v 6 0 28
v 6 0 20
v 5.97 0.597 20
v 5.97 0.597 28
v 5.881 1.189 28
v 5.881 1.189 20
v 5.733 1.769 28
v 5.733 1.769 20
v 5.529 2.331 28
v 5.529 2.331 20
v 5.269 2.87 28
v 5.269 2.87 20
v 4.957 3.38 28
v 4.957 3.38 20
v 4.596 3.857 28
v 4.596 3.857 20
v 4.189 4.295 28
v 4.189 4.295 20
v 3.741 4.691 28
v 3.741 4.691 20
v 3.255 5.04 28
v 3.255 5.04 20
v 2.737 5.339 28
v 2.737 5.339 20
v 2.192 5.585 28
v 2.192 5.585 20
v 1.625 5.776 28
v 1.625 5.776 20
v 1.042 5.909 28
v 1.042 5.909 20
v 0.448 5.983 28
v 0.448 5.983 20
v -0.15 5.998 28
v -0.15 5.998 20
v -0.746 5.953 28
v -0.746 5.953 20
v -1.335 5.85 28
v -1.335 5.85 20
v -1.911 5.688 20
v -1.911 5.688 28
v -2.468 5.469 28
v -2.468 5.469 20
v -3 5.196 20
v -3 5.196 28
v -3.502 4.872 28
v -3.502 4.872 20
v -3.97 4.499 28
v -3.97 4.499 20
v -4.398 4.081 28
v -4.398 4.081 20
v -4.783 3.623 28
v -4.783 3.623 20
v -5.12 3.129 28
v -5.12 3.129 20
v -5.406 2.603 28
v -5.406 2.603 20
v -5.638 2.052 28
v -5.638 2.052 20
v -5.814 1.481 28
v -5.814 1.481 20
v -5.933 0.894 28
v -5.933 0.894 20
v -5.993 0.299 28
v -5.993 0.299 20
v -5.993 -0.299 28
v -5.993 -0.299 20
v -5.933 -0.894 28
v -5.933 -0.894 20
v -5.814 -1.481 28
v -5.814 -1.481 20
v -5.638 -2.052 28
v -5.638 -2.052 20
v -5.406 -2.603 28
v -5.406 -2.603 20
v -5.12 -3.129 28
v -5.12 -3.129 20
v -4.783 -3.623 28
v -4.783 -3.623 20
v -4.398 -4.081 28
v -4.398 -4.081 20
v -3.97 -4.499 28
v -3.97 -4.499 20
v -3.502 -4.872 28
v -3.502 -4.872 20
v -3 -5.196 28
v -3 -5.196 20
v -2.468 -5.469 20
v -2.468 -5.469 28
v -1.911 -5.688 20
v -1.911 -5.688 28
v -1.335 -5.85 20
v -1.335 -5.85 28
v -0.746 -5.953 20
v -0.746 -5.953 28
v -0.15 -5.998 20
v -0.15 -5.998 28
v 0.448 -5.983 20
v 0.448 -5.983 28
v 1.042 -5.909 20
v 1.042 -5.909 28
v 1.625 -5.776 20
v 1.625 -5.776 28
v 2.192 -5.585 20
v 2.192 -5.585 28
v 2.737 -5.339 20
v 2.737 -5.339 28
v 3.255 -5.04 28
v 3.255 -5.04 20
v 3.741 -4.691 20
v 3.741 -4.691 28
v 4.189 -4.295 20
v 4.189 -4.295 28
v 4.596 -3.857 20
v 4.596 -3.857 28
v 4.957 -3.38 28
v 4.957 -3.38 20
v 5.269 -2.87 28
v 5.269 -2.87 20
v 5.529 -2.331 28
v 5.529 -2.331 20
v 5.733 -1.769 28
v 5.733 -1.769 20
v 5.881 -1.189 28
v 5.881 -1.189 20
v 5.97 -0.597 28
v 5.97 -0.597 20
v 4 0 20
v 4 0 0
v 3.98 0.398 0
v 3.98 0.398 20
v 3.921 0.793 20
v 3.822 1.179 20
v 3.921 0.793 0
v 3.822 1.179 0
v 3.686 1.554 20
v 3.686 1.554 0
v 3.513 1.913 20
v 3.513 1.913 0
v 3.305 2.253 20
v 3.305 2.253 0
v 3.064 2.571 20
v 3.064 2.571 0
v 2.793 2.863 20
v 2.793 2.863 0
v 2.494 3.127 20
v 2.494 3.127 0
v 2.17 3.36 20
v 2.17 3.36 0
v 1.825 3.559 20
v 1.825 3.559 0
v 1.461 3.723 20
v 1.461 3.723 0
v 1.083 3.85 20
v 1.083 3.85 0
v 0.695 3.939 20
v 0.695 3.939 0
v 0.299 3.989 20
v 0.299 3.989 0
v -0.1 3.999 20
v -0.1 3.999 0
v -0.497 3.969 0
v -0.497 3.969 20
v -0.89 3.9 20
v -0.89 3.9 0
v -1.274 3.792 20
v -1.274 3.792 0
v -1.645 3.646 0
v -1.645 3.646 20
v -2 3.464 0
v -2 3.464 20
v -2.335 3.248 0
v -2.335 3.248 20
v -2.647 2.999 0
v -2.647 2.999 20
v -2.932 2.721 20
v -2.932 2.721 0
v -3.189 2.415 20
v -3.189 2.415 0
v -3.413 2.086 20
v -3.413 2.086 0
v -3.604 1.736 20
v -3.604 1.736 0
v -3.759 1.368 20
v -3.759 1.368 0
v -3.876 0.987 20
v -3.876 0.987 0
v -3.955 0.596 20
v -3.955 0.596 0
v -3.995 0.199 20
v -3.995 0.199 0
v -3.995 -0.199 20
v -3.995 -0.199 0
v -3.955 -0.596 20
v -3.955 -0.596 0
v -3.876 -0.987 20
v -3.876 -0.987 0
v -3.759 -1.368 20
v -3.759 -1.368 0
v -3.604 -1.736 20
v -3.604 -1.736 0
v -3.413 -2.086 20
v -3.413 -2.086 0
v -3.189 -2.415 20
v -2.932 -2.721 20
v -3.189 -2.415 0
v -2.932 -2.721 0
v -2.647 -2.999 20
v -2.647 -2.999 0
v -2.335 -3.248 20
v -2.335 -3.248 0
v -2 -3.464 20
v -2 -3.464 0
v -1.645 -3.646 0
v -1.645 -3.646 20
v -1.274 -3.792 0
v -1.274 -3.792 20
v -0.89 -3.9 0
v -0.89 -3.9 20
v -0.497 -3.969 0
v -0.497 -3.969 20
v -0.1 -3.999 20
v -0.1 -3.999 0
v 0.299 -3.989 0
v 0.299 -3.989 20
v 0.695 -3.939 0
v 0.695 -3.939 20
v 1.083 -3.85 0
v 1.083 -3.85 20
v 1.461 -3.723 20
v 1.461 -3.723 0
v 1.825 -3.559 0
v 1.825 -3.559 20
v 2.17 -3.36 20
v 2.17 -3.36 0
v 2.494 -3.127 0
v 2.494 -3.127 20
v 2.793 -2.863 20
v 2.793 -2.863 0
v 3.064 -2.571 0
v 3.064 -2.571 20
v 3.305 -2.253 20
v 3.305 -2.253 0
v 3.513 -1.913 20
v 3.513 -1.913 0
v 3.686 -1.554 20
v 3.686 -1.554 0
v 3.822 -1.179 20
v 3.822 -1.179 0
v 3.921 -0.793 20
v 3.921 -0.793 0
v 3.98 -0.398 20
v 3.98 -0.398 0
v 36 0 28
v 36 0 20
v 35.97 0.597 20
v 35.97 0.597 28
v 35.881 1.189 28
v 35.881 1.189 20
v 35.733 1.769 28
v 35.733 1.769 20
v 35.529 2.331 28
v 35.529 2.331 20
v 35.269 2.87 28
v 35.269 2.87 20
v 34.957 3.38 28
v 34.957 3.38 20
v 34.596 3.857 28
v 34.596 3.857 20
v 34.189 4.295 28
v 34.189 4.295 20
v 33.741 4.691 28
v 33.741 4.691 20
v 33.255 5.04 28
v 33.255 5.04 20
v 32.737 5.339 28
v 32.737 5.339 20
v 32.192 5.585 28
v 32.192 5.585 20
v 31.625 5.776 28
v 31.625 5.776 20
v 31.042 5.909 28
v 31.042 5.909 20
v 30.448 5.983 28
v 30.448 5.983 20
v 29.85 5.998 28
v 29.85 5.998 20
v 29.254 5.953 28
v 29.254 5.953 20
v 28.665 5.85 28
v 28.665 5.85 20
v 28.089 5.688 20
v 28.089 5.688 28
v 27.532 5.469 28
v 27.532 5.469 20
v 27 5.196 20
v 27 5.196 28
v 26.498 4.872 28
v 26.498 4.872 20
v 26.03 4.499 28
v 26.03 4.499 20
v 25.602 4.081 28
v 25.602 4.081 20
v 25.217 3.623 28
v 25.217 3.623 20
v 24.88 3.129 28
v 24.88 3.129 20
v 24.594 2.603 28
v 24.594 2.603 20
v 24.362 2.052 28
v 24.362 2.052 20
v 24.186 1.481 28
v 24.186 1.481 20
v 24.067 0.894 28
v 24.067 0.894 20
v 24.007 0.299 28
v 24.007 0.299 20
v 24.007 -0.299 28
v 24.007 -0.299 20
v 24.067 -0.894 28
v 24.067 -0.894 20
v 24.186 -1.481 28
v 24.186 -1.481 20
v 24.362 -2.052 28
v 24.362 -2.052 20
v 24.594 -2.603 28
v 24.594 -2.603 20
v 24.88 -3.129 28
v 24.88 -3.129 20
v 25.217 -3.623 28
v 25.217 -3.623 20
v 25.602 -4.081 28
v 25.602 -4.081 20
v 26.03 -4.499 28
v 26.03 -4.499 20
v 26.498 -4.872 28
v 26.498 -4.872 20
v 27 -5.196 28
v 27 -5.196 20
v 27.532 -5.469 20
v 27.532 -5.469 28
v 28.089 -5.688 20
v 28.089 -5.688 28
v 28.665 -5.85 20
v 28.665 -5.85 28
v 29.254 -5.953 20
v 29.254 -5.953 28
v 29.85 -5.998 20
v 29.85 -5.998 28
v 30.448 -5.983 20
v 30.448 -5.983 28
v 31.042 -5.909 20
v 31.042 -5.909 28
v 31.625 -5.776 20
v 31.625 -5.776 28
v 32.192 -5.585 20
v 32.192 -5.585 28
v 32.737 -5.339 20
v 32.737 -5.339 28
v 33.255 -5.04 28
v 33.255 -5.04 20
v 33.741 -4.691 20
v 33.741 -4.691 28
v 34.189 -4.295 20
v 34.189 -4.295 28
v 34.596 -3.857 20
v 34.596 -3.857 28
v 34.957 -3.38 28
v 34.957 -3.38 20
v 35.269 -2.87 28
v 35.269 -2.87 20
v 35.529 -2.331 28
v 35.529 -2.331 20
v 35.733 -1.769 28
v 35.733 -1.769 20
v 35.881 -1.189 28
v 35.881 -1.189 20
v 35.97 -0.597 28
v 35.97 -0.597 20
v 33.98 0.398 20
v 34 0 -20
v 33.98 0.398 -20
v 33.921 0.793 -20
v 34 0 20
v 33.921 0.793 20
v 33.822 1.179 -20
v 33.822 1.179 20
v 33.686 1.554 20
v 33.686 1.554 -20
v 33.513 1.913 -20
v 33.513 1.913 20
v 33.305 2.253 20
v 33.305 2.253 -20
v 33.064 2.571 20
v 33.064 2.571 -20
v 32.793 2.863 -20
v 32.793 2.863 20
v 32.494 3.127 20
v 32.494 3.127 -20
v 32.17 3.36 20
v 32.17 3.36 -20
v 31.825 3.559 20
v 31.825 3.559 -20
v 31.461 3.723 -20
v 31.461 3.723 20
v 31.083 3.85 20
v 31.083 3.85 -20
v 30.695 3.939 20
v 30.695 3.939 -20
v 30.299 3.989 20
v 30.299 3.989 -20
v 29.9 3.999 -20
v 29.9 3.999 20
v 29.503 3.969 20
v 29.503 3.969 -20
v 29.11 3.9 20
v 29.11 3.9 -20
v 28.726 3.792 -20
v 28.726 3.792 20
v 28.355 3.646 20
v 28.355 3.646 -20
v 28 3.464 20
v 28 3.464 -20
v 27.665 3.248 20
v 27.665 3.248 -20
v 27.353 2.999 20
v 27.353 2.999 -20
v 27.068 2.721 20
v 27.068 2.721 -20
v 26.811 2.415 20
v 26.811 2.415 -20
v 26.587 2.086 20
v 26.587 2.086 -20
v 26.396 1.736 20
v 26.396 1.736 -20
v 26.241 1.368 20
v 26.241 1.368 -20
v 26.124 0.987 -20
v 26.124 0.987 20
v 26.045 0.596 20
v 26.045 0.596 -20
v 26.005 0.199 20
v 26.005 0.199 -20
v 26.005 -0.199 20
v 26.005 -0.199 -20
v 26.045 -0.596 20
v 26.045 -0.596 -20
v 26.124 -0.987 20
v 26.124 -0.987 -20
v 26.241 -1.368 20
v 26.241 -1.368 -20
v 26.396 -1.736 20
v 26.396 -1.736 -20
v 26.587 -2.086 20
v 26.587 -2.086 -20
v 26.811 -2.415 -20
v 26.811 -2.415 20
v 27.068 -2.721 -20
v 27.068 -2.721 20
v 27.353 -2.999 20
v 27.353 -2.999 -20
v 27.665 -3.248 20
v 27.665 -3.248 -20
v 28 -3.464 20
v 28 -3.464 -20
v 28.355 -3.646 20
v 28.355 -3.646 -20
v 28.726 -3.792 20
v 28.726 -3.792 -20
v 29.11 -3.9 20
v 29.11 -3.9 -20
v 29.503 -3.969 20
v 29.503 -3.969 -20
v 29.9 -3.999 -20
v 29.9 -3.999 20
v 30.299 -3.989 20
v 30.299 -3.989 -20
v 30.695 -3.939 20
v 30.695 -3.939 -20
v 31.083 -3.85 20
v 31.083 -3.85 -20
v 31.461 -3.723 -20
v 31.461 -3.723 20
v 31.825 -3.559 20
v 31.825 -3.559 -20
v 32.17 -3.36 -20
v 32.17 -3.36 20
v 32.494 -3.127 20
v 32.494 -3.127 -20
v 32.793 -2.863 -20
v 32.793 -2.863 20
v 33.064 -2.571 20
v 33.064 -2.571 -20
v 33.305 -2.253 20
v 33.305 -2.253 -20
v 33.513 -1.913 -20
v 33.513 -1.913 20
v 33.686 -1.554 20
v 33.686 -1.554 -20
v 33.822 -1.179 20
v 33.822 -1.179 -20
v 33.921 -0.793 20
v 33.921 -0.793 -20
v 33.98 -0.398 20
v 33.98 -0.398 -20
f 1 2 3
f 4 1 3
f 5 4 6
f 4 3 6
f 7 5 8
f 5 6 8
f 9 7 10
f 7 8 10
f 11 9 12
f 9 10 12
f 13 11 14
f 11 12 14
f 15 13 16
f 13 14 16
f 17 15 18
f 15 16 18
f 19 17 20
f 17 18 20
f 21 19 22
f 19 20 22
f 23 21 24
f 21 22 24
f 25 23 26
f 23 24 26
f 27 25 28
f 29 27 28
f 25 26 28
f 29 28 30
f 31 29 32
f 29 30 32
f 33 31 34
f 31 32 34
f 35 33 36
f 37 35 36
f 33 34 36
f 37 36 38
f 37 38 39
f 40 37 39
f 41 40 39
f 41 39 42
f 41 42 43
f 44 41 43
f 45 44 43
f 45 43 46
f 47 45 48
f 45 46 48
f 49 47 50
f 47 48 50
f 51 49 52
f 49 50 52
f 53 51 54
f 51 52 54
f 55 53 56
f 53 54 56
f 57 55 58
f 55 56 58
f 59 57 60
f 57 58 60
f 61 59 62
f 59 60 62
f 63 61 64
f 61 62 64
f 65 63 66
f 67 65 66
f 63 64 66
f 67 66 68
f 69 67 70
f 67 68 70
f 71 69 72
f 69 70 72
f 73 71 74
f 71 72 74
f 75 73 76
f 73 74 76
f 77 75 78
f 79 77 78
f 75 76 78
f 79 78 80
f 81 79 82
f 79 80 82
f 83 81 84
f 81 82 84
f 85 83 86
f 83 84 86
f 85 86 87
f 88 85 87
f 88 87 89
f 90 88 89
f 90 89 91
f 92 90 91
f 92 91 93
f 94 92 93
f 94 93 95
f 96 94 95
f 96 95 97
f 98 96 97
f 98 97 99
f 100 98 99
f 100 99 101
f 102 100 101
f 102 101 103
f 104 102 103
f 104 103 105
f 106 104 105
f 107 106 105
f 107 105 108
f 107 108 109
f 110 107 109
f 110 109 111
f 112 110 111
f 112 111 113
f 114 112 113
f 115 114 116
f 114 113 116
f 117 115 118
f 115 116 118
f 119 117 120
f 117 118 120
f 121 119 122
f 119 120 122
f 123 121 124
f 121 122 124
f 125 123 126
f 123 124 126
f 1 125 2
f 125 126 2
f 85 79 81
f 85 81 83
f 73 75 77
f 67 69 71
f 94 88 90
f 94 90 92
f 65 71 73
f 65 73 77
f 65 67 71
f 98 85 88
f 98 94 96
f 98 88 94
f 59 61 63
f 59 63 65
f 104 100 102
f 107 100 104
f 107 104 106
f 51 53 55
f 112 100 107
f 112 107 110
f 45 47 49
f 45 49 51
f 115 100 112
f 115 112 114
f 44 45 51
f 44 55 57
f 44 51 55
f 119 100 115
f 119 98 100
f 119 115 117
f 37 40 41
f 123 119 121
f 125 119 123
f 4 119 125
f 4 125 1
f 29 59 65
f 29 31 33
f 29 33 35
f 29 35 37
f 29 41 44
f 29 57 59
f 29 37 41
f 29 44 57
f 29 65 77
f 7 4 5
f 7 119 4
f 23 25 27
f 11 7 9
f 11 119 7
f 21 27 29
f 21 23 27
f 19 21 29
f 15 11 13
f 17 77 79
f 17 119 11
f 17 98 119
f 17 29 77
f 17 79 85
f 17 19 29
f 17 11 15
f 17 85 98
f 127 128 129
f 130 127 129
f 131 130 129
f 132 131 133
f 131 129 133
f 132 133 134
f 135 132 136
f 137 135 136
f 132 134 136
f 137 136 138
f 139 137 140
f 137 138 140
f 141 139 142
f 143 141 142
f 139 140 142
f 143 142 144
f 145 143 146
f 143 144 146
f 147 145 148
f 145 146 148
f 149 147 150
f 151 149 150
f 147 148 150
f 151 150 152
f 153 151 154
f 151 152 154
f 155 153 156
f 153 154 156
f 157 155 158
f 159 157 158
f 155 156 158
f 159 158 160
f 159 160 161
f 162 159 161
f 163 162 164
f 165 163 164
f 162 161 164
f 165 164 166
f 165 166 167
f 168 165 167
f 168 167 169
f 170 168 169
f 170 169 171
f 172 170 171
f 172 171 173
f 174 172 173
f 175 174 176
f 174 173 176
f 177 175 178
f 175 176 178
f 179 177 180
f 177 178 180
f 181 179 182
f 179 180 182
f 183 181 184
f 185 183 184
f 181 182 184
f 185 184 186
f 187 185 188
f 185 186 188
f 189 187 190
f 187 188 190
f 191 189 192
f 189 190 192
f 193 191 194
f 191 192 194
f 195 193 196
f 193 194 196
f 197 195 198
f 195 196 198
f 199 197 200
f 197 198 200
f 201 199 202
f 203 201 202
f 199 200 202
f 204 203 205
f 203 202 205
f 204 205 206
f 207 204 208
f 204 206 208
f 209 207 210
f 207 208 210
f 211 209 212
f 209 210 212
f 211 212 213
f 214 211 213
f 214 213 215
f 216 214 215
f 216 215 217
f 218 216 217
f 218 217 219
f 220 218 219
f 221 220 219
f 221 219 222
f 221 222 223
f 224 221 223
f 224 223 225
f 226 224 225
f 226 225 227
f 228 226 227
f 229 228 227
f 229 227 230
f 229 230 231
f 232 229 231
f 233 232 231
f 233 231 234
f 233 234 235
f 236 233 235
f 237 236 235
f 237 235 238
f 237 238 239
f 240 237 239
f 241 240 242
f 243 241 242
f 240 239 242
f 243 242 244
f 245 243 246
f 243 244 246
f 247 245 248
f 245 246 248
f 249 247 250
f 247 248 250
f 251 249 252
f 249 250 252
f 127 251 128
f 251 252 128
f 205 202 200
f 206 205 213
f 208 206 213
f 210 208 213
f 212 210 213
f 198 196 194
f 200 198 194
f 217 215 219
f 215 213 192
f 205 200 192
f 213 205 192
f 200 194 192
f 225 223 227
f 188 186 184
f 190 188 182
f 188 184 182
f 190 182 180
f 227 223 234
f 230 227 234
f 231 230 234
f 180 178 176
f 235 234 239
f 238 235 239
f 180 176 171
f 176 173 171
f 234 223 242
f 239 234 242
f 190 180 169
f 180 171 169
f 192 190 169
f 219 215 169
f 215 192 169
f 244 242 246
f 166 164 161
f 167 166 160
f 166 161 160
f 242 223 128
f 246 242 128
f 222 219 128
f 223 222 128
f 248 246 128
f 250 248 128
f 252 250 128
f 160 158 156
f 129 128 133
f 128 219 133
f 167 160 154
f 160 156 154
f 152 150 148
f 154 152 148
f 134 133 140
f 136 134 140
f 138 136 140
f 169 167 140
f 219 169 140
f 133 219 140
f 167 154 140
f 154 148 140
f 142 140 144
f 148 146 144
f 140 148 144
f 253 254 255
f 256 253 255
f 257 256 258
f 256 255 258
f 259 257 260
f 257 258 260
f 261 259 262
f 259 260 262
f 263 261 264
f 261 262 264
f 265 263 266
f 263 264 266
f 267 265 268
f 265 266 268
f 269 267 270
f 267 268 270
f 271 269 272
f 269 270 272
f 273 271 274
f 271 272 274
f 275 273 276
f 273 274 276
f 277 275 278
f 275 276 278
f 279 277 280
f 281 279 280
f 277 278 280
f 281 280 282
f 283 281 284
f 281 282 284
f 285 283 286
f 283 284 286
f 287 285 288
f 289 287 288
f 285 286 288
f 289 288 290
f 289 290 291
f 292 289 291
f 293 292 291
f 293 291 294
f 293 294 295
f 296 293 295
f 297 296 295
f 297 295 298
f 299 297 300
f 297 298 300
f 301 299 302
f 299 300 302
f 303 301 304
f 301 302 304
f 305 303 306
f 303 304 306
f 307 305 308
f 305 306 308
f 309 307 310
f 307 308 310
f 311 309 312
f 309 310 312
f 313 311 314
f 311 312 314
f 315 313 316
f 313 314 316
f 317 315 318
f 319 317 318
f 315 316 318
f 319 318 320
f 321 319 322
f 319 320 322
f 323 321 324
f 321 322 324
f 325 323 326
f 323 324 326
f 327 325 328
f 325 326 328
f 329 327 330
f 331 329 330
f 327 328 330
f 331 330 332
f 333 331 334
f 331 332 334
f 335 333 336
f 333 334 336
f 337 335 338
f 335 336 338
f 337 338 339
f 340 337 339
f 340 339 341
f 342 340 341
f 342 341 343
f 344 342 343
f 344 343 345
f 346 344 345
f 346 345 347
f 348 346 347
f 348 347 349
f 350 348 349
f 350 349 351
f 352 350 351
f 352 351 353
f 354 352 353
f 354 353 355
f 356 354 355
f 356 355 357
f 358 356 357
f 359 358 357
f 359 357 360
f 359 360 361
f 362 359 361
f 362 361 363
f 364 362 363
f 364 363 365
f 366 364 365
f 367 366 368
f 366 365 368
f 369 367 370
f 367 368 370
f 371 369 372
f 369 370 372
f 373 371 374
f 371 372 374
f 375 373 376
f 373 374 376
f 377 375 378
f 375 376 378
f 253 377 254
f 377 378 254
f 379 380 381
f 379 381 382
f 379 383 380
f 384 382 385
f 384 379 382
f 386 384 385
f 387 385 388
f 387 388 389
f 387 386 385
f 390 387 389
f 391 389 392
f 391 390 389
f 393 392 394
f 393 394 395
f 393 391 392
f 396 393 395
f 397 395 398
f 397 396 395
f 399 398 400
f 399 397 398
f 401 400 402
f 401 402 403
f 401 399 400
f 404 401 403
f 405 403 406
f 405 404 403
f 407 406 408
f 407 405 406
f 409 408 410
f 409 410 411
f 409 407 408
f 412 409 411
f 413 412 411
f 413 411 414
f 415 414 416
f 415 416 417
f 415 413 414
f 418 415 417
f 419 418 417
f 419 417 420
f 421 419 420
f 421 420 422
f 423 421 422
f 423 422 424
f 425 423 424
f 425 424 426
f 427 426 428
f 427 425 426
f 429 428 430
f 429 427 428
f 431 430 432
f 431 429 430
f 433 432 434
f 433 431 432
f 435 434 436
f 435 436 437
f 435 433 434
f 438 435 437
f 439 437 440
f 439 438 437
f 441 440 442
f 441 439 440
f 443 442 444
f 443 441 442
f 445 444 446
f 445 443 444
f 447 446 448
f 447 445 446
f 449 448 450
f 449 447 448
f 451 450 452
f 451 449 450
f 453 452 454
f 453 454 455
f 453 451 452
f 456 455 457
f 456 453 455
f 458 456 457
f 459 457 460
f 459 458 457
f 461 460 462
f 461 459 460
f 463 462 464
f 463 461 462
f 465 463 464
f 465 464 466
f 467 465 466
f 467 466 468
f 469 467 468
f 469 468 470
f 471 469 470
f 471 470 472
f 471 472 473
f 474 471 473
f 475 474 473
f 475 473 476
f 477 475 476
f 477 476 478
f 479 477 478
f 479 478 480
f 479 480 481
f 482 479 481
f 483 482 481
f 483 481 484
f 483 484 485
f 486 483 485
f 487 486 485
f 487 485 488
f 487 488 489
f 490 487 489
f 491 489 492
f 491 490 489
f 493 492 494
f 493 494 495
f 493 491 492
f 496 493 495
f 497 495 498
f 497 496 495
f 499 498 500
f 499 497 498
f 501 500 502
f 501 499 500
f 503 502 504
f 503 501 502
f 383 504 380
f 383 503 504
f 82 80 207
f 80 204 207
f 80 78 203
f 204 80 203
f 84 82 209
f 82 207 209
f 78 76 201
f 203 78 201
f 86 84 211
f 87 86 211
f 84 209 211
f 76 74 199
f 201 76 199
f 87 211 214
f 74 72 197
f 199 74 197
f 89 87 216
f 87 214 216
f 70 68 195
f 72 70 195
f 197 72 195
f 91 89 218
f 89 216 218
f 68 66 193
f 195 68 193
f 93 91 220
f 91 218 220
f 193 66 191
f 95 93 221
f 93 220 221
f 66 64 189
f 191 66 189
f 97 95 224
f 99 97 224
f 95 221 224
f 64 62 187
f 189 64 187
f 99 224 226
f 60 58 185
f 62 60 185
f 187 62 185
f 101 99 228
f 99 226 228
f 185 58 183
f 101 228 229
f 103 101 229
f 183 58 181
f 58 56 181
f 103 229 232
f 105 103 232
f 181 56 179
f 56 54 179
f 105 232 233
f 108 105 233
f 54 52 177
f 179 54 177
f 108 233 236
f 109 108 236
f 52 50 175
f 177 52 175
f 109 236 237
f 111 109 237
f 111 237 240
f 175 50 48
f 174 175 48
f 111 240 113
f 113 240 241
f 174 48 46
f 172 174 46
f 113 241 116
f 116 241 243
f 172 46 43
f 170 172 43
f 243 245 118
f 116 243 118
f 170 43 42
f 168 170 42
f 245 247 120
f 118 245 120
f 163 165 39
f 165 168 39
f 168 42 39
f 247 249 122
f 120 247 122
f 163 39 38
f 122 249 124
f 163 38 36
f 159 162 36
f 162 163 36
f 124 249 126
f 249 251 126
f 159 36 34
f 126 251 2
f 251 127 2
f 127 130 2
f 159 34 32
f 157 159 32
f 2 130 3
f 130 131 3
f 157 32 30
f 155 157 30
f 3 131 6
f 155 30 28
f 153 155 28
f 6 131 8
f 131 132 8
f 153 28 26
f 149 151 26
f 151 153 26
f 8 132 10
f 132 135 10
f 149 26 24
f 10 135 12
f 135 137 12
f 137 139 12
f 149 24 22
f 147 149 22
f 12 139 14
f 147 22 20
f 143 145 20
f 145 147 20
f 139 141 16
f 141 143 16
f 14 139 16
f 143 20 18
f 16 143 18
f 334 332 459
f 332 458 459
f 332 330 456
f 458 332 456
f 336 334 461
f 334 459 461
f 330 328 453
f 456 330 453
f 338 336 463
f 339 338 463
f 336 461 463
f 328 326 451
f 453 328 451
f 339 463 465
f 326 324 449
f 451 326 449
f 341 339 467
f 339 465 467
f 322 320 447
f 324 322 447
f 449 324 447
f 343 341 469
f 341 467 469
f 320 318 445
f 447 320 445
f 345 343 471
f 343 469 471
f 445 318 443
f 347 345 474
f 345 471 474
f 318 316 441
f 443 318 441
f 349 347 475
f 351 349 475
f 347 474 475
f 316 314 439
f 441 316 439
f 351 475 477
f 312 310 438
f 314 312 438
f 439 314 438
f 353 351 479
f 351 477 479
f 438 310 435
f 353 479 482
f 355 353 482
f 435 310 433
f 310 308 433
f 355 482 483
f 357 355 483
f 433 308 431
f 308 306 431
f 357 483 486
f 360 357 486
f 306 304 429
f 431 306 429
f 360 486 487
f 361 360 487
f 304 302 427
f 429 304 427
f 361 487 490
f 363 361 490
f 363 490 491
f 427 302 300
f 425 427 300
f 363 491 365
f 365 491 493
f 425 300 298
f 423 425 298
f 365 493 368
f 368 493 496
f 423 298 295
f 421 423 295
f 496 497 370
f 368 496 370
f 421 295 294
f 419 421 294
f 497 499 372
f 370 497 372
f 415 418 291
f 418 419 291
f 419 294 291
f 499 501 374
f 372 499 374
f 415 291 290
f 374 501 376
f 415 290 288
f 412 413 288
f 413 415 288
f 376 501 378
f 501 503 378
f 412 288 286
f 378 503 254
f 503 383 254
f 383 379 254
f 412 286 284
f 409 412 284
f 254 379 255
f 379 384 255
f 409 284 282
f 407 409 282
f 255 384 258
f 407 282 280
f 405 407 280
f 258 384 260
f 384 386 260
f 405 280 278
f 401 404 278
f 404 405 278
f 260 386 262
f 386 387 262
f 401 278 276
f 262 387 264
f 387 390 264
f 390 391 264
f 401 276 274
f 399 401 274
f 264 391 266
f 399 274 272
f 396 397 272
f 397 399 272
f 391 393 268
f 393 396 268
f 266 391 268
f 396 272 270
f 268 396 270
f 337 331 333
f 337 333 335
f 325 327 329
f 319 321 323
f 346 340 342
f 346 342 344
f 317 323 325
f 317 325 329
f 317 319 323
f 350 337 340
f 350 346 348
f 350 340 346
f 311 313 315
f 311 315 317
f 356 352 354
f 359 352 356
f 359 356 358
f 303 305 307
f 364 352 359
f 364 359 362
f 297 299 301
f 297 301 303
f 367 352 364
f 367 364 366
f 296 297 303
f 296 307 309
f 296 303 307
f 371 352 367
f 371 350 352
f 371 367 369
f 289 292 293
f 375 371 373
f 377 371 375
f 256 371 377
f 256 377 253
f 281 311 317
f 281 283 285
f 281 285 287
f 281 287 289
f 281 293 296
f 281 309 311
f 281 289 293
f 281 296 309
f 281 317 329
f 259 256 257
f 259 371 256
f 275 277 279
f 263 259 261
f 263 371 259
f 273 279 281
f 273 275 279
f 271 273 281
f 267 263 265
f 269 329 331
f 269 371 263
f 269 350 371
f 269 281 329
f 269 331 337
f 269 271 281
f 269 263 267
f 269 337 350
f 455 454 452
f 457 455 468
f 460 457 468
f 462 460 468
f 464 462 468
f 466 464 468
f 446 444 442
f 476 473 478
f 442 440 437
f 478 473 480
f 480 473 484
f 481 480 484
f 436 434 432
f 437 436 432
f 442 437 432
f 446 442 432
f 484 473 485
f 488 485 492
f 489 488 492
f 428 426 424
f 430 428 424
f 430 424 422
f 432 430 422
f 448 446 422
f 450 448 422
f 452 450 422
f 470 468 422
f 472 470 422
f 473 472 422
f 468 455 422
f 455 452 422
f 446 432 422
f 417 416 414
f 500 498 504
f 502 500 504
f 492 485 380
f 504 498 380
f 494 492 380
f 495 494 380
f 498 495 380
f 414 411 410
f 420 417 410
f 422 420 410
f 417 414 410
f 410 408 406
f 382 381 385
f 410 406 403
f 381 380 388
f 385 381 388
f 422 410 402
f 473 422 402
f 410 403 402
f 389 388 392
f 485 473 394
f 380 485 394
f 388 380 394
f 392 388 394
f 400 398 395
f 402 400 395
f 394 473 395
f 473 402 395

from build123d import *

# Parameters (mm, degrees)
F0_R     = 4
F1_DEPTH = 20
F2_R     = 6
F3_DEPTH = 8
F6_DEPTH = 20


# Not quite as in the source:
# - a feature of the source that left no trace in its solid (it failed there, or was rolled back) is left out


with BuildPart() as f1:
    # F0 (on Top) → F1 (new body)
    with BuildSketch(Plane.XY):
        Circle(F0_R)
    extrude(amount=F1_DEPTH)

    # F2 (on face) → F3 (join)
    with BuildSketch(Plane.XY.offset(20)):
        Circle(F2_R)
    extrude(amount=F3_DEPTH)


with BuildPart() as f5_1:
    # F5: copy of F1
    add(f1.part.moved(Location((30, 0, 0))))

    # F6 (add): a face of the model
    f6_faces = [f5_1.faces().sort_by_distance(p)[0] for p in [
        (30, 0, 0),
    ]]
    extrude(f6_faces, amount=F6_DEPTH)


solid = Compound([f1.part, f5_1.part])
